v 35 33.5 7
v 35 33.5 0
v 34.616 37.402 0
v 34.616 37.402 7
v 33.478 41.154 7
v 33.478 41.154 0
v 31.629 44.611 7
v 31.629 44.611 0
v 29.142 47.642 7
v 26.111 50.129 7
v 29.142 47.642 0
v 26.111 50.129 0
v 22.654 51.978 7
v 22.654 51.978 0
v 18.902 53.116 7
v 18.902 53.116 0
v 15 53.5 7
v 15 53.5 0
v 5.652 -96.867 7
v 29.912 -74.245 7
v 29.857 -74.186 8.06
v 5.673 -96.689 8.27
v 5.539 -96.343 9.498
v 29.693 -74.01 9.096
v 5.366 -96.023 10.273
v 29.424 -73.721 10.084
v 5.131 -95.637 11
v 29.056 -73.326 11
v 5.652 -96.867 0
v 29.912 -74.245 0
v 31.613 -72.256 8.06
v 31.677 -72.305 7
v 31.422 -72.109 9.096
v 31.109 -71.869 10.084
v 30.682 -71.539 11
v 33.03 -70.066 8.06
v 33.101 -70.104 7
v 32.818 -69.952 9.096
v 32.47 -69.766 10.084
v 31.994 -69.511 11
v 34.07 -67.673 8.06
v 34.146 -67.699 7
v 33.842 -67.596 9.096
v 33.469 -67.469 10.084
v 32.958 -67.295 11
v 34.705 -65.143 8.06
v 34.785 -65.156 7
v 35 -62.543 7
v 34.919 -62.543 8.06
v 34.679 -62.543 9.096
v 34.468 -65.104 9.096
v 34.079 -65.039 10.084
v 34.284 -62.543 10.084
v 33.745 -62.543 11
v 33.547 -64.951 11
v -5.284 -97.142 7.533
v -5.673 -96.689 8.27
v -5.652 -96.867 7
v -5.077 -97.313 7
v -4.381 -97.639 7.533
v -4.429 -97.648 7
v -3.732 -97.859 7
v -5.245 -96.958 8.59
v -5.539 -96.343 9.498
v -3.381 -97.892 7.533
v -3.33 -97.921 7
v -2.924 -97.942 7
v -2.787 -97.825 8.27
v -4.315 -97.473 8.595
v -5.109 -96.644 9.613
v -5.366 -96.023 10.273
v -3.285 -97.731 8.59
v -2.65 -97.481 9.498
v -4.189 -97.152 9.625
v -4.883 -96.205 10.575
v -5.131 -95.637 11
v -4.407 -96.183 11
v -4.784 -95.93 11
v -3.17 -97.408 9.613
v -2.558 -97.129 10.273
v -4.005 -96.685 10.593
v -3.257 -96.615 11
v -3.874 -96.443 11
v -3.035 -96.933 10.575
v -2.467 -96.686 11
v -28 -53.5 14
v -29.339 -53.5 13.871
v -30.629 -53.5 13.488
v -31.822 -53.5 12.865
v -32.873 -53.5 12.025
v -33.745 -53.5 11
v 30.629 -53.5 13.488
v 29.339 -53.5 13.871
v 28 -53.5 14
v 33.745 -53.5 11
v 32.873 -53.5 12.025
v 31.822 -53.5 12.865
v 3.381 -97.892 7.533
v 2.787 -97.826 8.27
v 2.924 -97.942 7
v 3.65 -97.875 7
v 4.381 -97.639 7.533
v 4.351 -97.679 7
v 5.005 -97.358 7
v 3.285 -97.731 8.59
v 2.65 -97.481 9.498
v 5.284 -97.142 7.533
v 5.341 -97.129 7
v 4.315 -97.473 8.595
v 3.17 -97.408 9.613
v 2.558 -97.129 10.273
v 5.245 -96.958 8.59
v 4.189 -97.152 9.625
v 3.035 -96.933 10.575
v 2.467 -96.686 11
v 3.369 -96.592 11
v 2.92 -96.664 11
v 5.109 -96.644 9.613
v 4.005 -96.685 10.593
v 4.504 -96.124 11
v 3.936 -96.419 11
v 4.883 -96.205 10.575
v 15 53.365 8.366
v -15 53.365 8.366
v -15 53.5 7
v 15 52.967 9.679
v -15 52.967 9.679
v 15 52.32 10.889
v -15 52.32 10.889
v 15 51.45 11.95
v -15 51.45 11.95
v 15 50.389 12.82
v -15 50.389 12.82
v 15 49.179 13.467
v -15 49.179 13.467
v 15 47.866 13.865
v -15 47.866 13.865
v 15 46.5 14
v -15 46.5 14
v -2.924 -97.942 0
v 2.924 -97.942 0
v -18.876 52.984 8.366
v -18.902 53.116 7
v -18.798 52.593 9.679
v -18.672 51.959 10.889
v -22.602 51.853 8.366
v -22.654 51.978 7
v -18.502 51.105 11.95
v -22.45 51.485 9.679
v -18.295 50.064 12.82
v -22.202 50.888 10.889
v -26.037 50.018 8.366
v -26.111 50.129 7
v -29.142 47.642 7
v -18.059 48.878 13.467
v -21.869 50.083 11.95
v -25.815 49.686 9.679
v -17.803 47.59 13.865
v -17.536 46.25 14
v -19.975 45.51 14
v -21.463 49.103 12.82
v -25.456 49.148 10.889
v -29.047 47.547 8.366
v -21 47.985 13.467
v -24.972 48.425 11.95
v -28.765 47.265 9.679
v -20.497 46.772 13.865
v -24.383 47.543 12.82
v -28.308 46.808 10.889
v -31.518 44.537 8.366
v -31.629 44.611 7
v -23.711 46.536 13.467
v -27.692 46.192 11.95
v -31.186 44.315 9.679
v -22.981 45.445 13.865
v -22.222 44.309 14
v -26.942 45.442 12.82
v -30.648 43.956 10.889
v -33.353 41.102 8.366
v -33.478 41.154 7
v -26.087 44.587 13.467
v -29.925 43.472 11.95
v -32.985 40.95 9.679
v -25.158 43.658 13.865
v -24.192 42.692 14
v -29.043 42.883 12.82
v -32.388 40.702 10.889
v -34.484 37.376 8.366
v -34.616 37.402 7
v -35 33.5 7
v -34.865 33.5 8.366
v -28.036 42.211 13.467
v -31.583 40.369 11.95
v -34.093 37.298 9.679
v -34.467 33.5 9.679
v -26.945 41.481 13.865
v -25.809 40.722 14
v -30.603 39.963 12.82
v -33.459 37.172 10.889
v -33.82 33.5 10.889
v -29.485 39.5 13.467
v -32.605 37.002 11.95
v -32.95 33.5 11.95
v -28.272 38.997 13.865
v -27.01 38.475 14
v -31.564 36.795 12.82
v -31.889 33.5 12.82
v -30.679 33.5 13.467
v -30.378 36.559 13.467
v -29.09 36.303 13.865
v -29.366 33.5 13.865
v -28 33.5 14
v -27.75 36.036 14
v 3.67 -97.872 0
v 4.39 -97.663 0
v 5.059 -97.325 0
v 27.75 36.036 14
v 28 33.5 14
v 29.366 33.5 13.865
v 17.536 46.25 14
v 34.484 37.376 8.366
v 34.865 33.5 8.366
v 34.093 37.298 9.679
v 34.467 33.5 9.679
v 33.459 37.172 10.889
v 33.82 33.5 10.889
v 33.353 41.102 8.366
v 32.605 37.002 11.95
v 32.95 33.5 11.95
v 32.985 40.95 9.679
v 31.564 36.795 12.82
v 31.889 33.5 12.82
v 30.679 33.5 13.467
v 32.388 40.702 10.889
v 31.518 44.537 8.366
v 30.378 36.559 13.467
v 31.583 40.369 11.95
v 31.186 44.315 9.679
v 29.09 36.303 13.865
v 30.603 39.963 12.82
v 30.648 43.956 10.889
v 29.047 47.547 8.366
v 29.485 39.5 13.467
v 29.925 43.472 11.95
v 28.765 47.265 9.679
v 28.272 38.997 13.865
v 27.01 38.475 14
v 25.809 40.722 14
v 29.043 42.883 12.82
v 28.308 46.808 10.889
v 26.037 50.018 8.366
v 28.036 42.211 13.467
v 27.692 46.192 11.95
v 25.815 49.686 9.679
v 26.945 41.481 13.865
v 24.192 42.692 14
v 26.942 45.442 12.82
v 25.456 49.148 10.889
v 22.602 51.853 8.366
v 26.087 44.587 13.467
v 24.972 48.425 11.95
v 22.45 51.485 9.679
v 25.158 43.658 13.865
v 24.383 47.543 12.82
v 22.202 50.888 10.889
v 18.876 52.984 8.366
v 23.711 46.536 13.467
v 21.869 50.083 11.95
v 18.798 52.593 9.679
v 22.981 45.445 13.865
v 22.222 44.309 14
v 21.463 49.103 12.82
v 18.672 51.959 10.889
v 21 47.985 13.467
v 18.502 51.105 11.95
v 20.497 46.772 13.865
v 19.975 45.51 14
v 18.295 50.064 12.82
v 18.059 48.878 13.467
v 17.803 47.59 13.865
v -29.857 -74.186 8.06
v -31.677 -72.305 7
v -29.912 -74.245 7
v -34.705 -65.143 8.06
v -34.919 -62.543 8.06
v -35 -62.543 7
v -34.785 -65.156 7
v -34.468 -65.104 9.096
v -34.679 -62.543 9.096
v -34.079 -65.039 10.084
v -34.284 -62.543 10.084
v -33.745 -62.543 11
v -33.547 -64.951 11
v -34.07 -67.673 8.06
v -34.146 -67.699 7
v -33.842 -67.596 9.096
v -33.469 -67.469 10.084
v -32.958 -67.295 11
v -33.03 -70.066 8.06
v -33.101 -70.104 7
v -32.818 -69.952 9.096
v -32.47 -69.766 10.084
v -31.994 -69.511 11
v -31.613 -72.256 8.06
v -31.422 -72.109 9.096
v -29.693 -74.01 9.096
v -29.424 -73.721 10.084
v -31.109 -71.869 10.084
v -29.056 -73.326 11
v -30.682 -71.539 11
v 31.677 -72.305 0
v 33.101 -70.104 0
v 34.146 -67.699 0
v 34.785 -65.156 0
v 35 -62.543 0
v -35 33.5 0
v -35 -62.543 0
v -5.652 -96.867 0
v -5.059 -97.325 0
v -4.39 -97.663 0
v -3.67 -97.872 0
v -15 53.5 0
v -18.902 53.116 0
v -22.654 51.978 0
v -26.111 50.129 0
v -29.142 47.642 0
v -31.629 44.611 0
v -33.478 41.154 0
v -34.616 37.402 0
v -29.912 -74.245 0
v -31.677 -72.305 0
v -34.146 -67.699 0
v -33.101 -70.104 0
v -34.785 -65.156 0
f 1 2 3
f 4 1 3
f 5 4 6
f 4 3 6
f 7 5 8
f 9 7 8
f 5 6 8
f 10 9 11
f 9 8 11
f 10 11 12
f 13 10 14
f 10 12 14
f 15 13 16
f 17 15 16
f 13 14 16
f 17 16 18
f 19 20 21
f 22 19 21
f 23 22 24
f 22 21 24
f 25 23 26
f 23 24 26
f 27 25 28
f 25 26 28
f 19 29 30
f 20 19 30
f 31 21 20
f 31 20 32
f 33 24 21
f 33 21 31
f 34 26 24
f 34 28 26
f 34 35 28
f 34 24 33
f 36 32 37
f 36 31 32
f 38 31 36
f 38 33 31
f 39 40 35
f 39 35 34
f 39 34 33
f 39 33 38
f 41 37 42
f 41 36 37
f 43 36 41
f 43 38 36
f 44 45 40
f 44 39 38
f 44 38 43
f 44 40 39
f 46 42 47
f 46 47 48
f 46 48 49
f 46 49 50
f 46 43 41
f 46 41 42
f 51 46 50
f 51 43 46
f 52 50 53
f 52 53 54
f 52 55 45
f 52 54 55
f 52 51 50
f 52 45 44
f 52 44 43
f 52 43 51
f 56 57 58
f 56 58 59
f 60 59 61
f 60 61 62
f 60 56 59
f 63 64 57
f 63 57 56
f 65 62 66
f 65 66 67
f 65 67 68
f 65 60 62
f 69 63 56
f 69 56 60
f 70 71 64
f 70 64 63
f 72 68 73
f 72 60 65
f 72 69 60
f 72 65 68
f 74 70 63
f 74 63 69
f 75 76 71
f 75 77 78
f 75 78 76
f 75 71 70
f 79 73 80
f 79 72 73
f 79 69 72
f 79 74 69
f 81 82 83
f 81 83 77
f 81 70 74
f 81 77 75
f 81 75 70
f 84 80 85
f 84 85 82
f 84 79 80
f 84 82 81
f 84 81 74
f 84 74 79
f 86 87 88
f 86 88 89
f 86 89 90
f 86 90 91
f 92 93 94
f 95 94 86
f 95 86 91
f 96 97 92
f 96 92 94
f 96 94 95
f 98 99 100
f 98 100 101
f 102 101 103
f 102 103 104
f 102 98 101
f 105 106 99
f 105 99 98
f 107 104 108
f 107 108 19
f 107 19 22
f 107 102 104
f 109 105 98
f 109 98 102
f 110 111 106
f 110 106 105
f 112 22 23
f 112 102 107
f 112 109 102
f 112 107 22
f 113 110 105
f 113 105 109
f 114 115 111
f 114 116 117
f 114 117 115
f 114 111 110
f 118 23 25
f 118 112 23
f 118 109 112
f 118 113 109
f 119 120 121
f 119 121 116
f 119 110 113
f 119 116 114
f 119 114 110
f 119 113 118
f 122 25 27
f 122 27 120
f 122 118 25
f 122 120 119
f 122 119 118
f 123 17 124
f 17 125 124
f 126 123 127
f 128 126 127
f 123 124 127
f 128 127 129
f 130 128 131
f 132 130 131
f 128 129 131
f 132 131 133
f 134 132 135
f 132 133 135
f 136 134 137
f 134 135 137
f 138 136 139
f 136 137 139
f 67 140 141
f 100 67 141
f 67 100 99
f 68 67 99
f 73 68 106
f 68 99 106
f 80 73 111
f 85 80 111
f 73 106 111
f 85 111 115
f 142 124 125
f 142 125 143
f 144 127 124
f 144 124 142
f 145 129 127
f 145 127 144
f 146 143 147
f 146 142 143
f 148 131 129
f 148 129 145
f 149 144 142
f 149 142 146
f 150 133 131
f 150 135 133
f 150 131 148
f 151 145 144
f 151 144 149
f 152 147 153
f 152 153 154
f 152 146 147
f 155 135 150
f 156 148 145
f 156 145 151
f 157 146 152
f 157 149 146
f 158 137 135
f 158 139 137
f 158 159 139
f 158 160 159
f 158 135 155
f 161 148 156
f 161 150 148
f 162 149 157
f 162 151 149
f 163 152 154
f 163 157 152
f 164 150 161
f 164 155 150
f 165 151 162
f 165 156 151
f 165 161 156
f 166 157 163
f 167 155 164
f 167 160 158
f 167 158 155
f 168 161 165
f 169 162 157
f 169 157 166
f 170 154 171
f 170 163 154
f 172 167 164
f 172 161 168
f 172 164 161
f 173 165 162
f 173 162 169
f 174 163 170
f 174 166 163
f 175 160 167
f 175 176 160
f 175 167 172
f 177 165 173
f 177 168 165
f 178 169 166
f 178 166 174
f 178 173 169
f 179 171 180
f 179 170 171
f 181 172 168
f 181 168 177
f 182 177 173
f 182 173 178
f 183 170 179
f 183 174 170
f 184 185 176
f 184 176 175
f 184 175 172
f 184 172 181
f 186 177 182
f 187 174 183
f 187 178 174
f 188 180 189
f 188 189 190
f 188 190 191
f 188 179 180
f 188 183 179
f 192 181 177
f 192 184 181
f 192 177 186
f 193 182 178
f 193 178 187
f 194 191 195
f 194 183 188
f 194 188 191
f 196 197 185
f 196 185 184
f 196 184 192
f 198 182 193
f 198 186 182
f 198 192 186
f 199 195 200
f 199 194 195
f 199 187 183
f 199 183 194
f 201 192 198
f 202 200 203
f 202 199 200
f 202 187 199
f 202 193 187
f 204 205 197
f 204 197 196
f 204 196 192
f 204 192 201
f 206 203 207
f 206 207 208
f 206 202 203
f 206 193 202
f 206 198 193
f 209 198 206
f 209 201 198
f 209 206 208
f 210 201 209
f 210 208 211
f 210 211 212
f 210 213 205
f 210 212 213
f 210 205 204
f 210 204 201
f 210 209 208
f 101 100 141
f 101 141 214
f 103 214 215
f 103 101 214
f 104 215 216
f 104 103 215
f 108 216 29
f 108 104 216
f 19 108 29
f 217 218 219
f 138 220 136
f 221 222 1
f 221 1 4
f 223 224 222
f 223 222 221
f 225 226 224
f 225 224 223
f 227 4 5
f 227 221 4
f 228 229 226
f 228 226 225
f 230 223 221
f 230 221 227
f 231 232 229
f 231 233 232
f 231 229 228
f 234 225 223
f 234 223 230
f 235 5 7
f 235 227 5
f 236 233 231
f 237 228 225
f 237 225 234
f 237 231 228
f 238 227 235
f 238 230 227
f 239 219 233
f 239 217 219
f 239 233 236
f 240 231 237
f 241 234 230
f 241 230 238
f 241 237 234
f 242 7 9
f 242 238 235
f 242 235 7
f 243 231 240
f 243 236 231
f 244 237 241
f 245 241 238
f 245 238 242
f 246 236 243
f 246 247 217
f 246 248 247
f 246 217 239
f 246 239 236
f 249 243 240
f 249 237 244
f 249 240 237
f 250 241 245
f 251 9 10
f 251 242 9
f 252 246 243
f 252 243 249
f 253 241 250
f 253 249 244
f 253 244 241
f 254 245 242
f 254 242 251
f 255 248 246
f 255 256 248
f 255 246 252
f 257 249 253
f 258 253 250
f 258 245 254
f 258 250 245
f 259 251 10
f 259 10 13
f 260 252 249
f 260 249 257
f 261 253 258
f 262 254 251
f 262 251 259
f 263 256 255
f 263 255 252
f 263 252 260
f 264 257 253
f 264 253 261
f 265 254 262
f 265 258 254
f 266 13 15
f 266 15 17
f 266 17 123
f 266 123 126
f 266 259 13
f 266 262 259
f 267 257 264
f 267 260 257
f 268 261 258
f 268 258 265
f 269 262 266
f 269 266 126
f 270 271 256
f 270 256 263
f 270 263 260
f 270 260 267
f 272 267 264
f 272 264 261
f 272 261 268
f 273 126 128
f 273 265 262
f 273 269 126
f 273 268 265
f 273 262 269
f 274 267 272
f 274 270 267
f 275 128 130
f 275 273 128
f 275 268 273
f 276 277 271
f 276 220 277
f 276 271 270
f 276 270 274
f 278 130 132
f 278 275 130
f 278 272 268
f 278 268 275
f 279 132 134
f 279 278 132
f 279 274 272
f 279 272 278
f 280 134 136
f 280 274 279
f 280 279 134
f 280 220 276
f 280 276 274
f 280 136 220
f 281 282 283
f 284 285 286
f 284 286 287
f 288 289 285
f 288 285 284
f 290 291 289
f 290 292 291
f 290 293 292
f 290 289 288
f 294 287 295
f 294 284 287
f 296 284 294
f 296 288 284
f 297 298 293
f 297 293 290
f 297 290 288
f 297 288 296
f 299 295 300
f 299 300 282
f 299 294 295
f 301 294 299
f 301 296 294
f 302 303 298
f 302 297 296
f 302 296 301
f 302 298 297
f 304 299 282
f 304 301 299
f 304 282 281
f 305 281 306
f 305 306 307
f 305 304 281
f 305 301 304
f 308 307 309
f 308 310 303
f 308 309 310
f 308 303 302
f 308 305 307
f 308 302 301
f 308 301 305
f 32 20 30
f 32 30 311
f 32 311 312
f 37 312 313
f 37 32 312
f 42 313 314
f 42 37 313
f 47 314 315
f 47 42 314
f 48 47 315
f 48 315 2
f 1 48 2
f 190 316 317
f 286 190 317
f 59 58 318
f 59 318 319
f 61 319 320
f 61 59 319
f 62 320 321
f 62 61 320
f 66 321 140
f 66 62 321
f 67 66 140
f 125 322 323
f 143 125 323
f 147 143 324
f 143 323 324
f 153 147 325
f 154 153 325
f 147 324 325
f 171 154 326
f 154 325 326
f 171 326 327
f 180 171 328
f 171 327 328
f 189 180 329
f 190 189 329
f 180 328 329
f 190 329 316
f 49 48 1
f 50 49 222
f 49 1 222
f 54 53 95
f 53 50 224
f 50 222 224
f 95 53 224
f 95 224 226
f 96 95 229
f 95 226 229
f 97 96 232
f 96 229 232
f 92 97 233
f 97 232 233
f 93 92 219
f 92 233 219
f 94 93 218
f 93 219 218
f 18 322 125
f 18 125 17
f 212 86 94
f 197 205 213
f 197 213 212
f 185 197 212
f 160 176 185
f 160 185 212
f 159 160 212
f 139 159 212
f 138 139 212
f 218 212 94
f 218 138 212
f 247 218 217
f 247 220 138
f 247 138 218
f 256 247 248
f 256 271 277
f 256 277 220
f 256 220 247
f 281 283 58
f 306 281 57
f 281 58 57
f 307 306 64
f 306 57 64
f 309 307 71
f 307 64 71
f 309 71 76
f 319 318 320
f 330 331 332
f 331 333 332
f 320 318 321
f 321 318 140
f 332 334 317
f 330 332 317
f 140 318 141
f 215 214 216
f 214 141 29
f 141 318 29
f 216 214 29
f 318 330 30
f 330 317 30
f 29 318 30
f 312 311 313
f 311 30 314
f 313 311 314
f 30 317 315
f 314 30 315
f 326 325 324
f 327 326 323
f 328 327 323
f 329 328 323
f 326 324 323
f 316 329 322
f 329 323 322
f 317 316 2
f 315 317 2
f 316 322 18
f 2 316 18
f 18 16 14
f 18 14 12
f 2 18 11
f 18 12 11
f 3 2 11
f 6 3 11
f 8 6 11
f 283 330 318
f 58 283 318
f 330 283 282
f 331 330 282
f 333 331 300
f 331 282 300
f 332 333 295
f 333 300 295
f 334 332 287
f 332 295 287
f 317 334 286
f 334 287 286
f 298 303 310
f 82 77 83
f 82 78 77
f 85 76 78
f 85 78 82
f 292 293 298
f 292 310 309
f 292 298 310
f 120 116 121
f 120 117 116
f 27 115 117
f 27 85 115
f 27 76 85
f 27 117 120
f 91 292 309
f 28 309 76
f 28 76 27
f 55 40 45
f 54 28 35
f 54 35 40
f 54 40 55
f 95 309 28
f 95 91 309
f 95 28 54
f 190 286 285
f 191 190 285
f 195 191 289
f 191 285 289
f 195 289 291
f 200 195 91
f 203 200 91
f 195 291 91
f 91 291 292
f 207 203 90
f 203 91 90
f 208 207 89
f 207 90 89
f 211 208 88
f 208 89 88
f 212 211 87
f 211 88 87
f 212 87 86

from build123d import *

# Parameters (mm, degrees)
PAD_DEPTH    = 14
FILLET001_R  = 4
FILLET002_R  = 16
FILLET_R     = 7
SKETCH059_W  = 80
SKETCH059_H  = 50
POCKET_DEPTH = 3


with BuildPart() as part:
    # Sketch → Pad (new body)
    with BuildSketch(Plane.XY):
        with BuildLine():
            Line((-35, -53.5), (-35, -69.5))
            Line((-35, -69.5), (-4.5, -97.94171))
            Line((-4.5, -97.94171), (4.5, -97.94171))
            Line((4.5, -97.94171), (35, -69.5))
            Line((35, -69.5), (35, -53.5))
            Line((35, 33.5), (35, -53.5))
            ThreePointArc((35, 33.5), (29.142136, 47.642136), (15, 53.5))
            Line((-15, 53.5), (15, 53.5))
            ThreePointArc((-15, 53.5), (-29.142136, 47.642136), (-35, 33.5))
            Line((-35, 33.5), (-35, -53.5))
        make_face()
    extrude(amount=PAD_DEPTH)

    # Fillet001
    fillet001_edges = [part.edges().sort_by_distance(p)[0] for p in [
        (-4.5, -97.94171, 7),
        (4.5, -97.94171, 7),
    ]]
    fillet(fillet001_edges, radius=FILLET001_R)

    # Fillet002
    fillet002_edges = [part.edges().sort_by_distance(p)[0] for p in [
        (35, -69.5, 7),
        (-35, -69.5, 7),
    ]]
    fillet(fillet002_edges, radius=FILLET002_R)

    # Fillet
    fillet_edges = [part.edges().sort_by_distance(p)[0] for p in [
        (-17.782163, -85.555893, 14),
        (-33.672961, -68.922987, 14),
        (-4.390363, -97.66338, 14),
        (-35, -58.021501, 14),
        (0, -97.94171, 14),
        (-35, -10, 14),
        (4.390363, -97.66338, 14),
        (-29.142136, 47.642136, 14),
        (17.782163, -85.555893, 14),
        (0, 53.5, 14),
        (33.672961, -68.922987, 14),
        (29.142136, 47.642136, 14),
        (35, -58.021501, 14),
        (35, -10, 14),
    ]]
    fillet(fillet_edges, radius=FILLET_R)

    # Sketch059 (on Face8 of Clone015) → Pocket (cut)
    with BuildSketch(Plane.XY.offset(14)):
        with Locations((0, -78.5)):
            Rectangle(SKETCH059_W, SKETCH059_H)
    extrude(amount=-POCKET_DEPTH, mode=Mode.SUBTRACT)


solid = part.part
